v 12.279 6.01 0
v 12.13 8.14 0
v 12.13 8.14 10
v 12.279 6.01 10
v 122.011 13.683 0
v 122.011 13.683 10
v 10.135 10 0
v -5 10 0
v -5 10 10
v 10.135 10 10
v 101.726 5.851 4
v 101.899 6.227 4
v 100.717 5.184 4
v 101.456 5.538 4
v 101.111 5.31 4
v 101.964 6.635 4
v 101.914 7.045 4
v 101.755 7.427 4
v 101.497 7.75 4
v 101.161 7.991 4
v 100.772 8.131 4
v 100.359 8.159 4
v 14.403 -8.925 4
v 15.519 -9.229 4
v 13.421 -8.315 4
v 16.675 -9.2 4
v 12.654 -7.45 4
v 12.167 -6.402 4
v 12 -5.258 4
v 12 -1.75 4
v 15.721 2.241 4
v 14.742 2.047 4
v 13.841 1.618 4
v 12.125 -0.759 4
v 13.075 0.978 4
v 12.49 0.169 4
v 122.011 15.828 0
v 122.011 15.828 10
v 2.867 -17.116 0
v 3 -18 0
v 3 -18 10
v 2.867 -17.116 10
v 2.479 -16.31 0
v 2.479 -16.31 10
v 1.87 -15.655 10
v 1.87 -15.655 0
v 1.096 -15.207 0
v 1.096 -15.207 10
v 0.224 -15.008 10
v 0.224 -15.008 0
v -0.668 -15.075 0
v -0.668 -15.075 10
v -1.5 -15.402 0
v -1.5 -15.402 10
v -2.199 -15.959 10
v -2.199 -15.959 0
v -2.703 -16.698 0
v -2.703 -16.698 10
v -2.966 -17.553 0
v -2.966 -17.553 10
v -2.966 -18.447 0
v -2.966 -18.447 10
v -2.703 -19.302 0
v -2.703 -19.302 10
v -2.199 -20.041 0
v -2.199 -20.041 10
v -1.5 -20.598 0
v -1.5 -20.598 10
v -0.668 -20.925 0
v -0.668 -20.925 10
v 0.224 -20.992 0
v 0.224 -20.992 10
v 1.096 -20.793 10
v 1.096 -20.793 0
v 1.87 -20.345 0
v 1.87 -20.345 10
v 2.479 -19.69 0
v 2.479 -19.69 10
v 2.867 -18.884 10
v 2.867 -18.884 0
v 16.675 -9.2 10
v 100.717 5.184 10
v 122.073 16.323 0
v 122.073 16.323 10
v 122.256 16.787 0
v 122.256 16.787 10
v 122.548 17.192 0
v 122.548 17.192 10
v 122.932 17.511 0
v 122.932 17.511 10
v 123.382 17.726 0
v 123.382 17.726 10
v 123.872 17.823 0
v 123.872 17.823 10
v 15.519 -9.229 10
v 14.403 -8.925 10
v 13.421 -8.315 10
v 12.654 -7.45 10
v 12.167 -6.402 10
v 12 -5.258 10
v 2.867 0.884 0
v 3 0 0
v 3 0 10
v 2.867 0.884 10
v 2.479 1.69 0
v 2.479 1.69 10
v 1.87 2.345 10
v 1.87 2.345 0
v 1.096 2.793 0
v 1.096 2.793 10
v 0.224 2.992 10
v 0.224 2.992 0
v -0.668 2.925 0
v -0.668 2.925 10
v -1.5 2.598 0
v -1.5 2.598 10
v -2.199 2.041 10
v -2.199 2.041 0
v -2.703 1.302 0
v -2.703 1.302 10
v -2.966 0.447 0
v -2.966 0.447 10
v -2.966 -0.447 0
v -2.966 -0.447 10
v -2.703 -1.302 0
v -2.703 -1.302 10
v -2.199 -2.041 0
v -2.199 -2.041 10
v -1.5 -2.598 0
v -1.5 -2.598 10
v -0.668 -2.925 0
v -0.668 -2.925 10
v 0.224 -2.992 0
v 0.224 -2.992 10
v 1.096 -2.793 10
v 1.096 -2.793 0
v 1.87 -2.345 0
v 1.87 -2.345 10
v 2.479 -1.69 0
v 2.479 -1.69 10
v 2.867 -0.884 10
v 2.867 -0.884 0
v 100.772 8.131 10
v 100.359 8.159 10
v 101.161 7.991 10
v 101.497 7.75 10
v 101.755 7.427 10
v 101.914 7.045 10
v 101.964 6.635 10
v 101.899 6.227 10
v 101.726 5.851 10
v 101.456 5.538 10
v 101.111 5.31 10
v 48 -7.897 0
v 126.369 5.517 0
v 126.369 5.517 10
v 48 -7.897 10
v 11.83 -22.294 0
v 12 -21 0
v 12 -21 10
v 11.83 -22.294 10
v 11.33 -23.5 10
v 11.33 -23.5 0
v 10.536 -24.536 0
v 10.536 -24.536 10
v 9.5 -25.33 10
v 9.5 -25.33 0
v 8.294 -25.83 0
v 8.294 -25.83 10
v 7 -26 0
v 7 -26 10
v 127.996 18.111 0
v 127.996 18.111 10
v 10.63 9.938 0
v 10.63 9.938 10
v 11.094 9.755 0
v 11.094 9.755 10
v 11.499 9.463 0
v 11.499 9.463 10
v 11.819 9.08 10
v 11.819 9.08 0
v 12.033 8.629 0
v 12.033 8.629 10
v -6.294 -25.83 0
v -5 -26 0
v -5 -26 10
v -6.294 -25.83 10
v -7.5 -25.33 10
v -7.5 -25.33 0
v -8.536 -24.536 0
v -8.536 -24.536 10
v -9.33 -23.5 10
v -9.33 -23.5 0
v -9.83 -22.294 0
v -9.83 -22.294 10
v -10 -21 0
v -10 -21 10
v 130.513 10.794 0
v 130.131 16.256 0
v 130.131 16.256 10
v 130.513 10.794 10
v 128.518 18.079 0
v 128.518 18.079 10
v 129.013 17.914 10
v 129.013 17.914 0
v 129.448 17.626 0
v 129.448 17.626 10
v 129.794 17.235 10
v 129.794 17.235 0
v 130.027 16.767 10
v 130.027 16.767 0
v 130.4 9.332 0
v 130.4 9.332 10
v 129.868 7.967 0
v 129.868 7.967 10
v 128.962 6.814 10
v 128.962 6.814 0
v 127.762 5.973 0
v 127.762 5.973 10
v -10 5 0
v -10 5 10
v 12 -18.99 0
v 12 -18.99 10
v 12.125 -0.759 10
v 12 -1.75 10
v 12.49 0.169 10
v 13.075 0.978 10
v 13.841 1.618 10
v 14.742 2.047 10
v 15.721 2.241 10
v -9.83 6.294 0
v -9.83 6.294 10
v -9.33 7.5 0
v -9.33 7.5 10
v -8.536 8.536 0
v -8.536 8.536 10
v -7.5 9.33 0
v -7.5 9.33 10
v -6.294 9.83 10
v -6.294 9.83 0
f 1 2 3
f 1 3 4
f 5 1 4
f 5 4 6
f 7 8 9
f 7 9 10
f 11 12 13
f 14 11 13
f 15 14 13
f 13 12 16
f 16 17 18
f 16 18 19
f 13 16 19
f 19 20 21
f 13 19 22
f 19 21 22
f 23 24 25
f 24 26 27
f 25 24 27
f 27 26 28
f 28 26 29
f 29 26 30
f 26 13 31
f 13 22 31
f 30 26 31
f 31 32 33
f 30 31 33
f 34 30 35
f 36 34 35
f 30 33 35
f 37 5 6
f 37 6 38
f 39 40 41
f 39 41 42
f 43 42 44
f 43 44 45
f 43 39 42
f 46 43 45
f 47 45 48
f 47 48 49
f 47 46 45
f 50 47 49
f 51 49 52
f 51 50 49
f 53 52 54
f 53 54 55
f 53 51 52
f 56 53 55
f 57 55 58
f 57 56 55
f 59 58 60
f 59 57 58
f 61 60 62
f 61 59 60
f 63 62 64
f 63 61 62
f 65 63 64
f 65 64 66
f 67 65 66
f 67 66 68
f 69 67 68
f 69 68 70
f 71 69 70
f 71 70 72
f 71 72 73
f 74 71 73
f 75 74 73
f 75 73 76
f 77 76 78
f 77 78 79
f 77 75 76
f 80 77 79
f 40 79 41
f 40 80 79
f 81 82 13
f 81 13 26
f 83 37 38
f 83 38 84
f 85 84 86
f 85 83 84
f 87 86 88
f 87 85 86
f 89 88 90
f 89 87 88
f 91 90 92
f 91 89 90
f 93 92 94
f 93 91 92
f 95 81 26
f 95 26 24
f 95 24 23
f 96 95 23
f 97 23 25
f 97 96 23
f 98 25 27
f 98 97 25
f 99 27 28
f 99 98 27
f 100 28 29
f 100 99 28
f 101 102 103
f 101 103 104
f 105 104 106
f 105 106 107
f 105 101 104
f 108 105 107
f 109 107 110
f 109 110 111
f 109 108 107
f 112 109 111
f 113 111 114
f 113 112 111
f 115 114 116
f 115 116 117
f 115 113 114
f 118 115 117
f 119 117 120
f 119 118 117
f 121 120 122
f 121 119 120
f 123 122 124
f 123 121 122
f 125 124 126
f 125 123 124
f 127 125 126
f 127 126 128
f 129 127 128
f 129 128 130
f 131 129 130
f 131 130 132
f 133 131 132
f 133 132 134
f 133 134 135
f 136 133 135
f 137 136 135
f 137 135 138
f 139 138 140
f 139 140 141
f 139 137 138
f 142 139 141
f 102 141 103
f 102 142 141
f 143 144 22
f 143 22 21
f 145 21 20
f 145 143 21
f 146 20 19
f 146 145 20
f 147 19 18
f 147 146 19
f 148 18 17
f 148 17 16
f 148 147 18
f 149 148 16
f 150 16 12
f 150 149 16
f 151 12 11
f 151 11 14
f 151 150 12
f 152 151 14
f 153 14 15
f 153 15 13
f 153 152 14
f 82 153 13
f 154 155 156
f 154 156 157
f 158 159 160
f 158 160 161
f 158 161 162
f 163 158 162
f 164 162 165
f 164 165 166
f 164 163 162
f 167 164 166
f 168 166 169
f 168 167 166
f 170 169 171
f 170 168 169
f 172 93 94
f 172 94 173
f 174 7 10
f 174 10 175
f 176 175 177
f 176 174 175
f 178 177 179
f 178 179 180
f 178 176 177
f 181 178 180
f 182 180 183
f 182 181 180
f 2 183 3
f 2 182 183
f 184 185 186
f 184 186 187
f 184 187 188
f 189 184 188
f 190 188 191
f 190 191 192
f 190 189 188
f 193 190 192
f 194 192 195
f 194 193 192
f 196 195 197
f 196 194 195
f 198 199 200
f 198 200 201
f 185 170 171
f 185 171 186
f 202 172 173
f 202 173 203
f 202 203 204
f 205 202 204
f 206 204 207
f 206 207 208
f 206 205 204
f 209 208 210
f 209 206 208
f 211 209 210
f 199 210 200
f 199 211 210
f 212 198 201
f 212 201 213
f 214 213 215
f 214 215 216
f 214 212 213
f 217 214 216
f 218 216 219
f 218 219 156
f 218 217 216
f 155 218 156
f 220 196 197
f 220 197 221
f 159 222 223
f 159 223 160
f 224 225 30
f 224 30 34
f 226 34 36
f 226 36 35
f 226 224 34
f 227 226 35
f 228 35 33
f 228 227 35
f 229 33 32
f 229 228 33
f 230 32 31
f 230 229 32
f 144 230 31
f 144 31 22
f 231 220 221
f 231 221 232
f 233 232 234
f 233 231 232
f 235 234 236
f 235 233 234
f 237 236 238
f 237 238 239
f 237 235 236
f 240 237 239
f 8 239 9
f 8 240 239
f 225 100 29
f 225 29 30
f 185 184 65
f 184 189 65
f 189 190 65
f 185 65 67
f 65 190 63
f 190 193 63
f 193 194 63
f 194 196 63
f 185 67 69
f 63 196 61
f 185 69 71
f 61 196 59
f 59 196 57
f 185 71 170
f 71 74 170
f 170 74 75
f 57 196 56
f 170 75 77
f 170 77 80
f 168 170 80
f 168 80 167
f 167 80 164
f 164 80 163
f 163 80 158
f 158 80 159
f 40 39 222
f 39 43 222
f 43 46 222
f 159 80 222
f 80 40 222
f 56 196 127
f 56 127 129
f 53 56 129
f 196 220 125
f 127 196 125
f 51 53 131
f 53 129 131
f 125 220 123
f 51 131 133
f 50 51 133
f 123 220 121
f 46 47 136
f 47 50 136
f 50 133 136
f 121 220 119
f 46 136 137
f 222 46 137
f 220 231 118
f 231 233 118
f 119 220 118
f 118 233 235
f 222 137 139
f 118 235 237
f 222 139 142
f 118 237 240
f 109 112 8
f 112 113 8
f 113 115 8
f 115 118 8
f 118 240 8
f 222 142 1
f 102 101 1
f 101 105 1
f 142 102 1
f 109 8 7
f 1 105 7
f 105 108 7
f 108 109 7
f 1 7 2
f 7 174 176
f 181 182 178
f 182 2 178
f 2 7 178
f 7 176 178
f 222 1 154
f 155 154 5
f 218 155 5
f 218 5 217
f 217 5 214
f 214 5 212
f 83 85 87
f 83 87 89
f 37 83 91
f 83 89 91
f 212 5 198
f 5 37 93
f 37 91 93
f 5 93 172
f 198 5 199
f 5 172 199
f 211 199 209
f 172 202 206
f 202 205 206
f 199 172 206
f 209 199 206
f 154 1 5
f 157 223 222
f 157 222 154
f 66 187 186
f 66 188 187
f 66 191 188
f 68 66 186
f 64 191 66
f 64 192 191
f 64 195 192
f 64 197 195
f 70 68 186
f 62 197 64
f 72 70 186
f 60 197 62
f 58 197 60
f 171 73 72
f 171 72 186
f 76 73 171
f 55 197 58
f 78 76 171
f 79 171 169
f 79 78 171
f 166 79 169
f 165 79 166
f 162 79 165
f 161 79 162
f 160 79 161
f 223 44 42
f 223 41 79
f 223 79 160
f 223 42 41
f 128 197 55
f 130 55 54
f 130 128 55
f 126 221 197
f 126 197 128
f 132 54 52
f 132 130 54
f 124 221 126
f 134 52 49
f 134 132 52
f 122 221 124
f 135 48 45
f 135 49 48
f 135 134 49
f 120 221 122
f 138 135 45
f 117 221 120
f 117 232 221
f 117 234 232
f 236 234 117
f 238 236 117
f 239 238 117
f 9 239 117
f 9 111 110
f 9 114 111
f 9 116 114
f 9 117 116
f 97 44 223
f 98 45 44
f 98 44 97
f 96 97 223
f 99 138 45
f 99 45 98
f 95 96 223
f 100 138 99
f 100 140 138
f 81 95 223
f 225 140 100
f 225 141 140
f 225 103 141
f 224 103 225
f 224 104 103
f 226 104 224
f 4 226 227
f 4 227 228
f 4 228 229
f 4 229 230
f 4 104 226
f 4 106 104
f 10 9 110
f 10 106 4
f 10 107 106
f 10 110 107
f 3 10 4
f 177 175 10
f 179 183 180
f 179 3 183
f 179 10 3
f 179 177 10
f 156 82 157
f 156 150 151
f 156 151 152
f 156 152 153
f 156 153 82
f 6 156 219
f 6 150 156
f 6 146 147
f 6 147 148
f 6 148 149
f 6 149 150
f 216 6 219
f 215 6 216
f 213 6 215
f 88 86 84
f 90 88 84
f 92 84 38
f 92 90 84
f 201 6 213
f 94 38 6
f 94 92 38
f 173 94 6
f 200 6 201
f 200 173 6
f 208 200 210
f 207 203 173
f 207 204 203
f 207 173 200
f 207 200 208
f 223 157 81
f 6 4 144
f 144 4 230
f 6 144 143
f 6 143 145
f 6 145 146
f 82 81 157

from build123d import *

# Parameters (mm, degrees)
SKETCH1_R           = 3
BOSS_EXTRUDE1_DEPTH = 10
CUT_EXTRUDE1_DEPTH  = 6
BOSS_EXTRUDE2_DEPTH = 10


with BuildPart() as part:
    # Sketch1 → Boss-Extrude1 (new body)
    with BuildSketch(Plane.XY):
        with BuildLine():
            Line((-5, 10), (10.134969828, 10))
            ThreePointArc((10.134969828, 10), (11.498966548, 9.462707403), (12.130097928, 8.139512947))
            Line((12.130097928, 8.139512947), (12.279025895, 6.009743799))
            Line((12.279025895, 6.009743799), (122.011071424, 13.682955911))
            Line((122.011071424, 13.682955911), (122.011071424, 15.827693331))
            ThreePointArc((122.011071424, 15.827693331), (122.54836402, 17.191690051), (123.871558476, 17.822821431))
            Line((123.871558476, 17.822821431), (127.996455725, 18.111262346))
            ThreePointArc((127.996455725, 18.111262346), (129.448086731, 17.625553406), (130.131096773, 16.255647193))
            Line((130.131096773, 16.255647193), (130.513028814, 10.79376454))
            ThreePointArc((130.513028814, 10.79376454), (129.45752894, 7.356802052), (126.3687377, 5.516649939))
            Line((126.3687377, 5.516649939), (12, -14.058605554))
            Line((12, -14.058605554), (12, -21))
            ThreePointArc((12, -21), (10.535533906, -24.535533906), (7, -26))
            Line((7, -26), (-5, -26))
            ThreePointArc((-5, -26), (-8.535533906, -24.535533906), (-10, -21))
            Line((-10, -21), (-10, 5))
            ThreePointArc((-10, 5), (-8.535533906, 8.535533906), (-5, 10))
        make_face()
        Circle(SKETCH1_R, mode=Mode.SUBTRACT)
        with Locations((0, -18)):
            Circle(SKETCH1_R, mode=Mode.SUBTRACT)
    extrude(amount=BOSS_EXTRUDE1_DEPTH)

    # Sketch2 → Cut-Extrude1 (cut)
    with BuildSketch(Plane.XY.offset(10)):
        with BuildLine():
            Line((12, -5.257633034), (12, -1.749595529))
            ThreePointArc((12, -1.749595529), (13.074585194, 0.978397911), (15.720974105, 2.240660672))
            Line((15.720974105, 2.240660672), (100.359457674, 8.159159996))
            ThreePointArc((100.359457674, 8.159159996), (101.953365437, 6.84188311), (100.717151126, 5.18431425))
            Line((100.717151126, 5.18431425), (16.67482331, -9.20029882))
            ThreePointArc((16.67482331, -9.20029882), (13.421172092, -8.31535222), (12, -5.257633034))
        make_face()
    extrude(amount=-CUT_EXTRUDE1_DEPTH, mode=Mode.SUBTRACT)

    # Sketch4 → Boss-Extrude2 (add)
    with BuildSketch(Plane.XY.offset(10)):
        Polygon((12, -18.990256201), (48, -7.896876292), (12, -14.058605554), align=None)
    extrude(amount=-BOSS_EXTRUDE2_DEPTH)


solid = part.part
